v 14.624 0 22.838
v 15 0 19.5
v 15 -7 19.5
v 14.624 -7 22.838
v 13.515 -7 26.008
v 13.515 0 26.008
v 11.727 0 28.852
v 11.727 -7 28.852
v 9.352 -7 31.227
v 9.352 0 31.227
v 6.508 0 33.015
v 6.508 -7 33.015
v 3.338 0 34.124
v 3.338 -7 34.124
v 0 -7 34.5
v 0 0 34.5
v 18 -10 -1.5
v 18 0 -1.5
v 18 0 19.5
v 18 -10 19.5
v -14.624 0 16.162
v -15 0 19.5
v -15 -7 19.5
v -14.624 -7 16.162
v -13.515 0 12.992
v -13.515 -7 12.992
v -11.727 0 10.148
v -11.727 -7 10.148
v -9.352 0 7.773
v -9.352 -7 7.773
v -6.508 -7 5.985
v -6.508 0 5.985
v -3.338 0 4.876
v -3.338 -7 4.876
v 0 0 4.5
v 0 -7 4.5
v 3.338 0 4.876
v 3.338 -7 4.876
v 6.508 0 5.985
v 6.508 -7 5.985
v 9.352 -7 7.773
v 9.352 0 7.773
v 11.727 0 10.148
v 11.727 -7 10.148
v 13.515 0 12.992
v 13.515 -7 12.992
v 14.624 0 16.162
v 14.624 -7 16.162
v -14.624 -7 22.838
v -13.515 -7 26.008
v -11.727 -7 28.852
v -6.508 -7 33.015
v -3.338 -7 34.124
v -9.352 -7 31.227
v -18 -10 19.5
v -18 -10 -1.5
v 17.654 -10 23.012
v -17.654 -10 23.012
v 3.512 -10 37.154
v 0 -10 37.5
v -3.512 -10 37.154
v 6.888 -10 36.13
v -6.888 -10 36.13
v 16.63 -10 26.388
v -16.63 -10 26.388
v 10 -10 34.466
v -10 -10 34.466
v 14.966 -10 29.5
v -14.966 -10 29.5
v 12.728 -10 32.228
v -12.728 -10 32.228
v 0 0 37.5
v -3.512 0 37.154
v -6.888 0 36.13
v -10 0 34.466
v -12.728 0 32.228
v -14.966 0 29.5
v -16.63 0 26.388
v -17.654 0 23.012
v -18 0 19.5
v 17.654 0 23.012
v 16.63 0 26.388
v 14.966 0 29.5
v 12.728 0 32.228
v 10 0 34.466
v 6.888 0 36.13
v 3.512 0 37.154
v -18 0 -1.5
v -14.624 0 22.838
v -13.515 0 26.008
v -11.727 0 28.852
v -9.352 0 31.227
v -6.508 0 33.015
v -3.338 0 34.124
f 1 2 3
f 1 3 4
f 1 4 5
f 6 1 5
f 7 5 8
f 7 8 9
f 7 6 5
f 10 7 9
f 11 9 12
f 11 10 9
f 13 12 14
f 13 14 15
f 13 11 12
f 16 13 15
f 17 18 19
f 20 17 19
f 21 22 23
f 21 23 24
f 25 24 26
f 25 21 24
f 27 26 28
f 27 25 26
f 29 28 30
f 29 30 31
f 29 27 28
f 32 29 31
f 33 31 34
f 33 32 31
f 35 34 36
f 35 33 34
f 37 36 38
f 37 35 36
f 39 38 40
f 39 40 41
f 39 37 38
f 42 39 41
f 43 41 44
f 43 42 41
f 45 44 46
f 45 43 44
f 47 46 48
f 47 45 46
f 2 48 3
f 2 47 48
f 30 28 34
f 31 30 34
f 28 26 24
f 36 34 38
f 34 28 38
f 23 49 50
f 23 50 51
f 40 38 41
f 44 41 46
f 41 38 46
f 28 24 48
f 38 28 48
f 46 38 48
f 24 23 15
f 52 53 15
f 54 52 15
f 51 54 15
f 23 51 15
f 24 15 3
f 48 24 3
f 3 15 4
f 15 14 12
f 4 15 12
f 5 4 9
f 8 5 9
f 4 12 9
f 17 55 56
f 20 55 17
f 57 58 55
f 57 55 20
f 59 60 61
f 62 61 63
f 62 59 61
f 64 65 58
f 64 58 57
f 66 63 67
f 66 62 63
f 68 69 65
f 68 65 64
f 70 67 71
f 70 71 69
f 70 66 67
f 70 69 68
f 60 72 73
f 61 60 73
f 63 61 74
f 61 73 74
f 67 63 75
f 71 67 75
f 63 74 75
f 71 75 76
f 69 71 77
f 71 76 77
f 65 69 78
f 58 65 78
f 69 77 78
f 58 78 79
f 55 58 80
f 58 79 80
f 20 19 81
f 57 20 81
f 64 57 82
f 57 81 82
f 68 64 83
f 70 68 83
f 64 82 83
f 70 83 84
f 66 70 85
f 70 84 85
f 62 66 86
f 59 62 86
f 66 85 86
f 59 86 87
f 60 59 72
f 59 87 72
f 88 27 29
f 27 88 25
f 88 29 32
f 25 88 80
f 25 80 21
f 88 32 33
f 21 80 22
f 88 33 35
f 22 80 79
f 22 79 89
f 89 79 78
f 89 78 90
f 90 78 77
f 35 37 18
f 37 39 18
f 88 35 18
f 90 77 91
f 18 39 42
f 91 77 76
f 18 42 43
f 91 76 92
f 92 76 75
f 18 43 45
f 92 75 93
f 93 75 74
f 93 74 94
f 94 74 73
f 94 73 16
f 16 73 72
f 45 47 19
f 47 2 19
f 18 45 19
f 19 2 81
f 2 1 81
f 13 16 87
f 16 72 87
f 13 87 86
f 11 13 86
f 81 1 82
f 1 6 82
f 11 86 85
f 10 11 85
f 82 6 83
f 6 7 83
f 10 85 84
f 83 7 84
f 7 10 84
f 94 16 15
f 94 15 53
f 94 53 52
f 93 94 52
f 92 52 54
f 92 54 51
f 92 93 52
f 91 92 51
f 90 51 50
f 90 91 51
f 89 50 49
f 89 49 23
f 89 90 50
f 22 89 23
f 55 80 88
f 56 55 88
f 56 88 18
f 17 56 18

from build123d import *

# Parameters (mm, degrees)
F1_DEPTH = 10
F2_DEPTH = 7


with BuildPart() as f1:
    # F0 (on Front) → F1 (new body)
    with BuildSketch(Plane.XZ):
        with BuildLine():
            ThreePointArc((0, 34.5), (-10.606602, 30.106602), (-15, 19.5))
            Line((-15, 19.5), (0, 19.5))
            Line((0, 19.5), (15, 19.5))
            ThreePointArc((15, 19.5), (10.606602, 30.106602), (0, 34.5))
        make_face()
        with BuildLine():
            ThreePointArc((-18, 19.5), (-12.727922, 6.772078), (0, 1.5))
            ThreePointArc((0, 1.5), (12.727922, 6.772078), (18, 19.5))
            Line((18, 19.5), (15, 19.5))
            ThreePointArc((15, 19.5), (0, 4.5), (-15, 19.5))
            Line((-15, 19.5), (-18, 19.5))
        make_face()
        Polygon((0, 1.5), (-18, 1.5), (-18, -1.5), (18, -1.5), (18, 1.5), align=None)
        with BuildLine():
            ThreePointArc((18, 19.5), (12.727922, 6.772078), (0, 1.5))
            Line((0, 1.5), (18, 1.5))
            Line((18, 1.5), (18, 19.5))
        make_face()
        with BuildLine():
            Line((0, 19.5), (-15, 19.5))
            ThreePointArc((-15, 19.5), (0, 4.5), (15, 19.5))
            Line((15, 19.5), (0, 19.5))
        make_face()
        with BuildLine():
            Line((15, 19.5), (18, 19.5))
            ThreePointArc((18, 19.5), (12.727922, 32.227922), (0, 37.5))
            Line((0, 37.5), (0, 34.5))
            ThreePointArc((0, 34.5), (10.606602, 30.106602), (15, 19.5))
        make_face()
        with BuildLine():
            ThreePointArc((0, 37.5), (-12.727922, 32.227922), (-18, 19.5))
            Line((-18, 19.5), (-15, 19.5))
            ThreePointArc((-15, 19.5), (-10.606602, 30.106602), (0, 34.5))
            Line((0, 34.5), (0, 37.5))
        make_face()
        with BuildLine():
            Line((-18, 19.5), (-18, 1.5))
            Line((-18, 1.5), (0, 1.5))
            ThreePointArc((0, 1.5), (-12.727922, 6.772078), (-18, 19.5))
        make_face()
    extrude(amount=F1_DEPTH)

    # F0 (on Front) → F2 (cut)
    with BuildSketch(Plane.XZ):
        with BuildLine():
            Line((0, 19.5), (-15, 19.5))
            ThreePointArc((-15, 19.5), (0, 4.5), (15, 19.5))
            Line((15, 19.5), (0, 19.5))
        make_face()
        with BuildLine():
            ThreePointArc((0, 34.5), (-10.606602, 30.106602), (-15, 19.5))
            Line((-15, 19.5), (0, 19.5))
            Line((0, 19.5), (15, 19.5))
            ThreePointArc((15, 19.5), (10.606602, 30.106602), (0, 34.5))
        make_face()
    extrude(amount=F2_DEPTH, mode=Mode.SUBTRACT)


solid = f1.part
